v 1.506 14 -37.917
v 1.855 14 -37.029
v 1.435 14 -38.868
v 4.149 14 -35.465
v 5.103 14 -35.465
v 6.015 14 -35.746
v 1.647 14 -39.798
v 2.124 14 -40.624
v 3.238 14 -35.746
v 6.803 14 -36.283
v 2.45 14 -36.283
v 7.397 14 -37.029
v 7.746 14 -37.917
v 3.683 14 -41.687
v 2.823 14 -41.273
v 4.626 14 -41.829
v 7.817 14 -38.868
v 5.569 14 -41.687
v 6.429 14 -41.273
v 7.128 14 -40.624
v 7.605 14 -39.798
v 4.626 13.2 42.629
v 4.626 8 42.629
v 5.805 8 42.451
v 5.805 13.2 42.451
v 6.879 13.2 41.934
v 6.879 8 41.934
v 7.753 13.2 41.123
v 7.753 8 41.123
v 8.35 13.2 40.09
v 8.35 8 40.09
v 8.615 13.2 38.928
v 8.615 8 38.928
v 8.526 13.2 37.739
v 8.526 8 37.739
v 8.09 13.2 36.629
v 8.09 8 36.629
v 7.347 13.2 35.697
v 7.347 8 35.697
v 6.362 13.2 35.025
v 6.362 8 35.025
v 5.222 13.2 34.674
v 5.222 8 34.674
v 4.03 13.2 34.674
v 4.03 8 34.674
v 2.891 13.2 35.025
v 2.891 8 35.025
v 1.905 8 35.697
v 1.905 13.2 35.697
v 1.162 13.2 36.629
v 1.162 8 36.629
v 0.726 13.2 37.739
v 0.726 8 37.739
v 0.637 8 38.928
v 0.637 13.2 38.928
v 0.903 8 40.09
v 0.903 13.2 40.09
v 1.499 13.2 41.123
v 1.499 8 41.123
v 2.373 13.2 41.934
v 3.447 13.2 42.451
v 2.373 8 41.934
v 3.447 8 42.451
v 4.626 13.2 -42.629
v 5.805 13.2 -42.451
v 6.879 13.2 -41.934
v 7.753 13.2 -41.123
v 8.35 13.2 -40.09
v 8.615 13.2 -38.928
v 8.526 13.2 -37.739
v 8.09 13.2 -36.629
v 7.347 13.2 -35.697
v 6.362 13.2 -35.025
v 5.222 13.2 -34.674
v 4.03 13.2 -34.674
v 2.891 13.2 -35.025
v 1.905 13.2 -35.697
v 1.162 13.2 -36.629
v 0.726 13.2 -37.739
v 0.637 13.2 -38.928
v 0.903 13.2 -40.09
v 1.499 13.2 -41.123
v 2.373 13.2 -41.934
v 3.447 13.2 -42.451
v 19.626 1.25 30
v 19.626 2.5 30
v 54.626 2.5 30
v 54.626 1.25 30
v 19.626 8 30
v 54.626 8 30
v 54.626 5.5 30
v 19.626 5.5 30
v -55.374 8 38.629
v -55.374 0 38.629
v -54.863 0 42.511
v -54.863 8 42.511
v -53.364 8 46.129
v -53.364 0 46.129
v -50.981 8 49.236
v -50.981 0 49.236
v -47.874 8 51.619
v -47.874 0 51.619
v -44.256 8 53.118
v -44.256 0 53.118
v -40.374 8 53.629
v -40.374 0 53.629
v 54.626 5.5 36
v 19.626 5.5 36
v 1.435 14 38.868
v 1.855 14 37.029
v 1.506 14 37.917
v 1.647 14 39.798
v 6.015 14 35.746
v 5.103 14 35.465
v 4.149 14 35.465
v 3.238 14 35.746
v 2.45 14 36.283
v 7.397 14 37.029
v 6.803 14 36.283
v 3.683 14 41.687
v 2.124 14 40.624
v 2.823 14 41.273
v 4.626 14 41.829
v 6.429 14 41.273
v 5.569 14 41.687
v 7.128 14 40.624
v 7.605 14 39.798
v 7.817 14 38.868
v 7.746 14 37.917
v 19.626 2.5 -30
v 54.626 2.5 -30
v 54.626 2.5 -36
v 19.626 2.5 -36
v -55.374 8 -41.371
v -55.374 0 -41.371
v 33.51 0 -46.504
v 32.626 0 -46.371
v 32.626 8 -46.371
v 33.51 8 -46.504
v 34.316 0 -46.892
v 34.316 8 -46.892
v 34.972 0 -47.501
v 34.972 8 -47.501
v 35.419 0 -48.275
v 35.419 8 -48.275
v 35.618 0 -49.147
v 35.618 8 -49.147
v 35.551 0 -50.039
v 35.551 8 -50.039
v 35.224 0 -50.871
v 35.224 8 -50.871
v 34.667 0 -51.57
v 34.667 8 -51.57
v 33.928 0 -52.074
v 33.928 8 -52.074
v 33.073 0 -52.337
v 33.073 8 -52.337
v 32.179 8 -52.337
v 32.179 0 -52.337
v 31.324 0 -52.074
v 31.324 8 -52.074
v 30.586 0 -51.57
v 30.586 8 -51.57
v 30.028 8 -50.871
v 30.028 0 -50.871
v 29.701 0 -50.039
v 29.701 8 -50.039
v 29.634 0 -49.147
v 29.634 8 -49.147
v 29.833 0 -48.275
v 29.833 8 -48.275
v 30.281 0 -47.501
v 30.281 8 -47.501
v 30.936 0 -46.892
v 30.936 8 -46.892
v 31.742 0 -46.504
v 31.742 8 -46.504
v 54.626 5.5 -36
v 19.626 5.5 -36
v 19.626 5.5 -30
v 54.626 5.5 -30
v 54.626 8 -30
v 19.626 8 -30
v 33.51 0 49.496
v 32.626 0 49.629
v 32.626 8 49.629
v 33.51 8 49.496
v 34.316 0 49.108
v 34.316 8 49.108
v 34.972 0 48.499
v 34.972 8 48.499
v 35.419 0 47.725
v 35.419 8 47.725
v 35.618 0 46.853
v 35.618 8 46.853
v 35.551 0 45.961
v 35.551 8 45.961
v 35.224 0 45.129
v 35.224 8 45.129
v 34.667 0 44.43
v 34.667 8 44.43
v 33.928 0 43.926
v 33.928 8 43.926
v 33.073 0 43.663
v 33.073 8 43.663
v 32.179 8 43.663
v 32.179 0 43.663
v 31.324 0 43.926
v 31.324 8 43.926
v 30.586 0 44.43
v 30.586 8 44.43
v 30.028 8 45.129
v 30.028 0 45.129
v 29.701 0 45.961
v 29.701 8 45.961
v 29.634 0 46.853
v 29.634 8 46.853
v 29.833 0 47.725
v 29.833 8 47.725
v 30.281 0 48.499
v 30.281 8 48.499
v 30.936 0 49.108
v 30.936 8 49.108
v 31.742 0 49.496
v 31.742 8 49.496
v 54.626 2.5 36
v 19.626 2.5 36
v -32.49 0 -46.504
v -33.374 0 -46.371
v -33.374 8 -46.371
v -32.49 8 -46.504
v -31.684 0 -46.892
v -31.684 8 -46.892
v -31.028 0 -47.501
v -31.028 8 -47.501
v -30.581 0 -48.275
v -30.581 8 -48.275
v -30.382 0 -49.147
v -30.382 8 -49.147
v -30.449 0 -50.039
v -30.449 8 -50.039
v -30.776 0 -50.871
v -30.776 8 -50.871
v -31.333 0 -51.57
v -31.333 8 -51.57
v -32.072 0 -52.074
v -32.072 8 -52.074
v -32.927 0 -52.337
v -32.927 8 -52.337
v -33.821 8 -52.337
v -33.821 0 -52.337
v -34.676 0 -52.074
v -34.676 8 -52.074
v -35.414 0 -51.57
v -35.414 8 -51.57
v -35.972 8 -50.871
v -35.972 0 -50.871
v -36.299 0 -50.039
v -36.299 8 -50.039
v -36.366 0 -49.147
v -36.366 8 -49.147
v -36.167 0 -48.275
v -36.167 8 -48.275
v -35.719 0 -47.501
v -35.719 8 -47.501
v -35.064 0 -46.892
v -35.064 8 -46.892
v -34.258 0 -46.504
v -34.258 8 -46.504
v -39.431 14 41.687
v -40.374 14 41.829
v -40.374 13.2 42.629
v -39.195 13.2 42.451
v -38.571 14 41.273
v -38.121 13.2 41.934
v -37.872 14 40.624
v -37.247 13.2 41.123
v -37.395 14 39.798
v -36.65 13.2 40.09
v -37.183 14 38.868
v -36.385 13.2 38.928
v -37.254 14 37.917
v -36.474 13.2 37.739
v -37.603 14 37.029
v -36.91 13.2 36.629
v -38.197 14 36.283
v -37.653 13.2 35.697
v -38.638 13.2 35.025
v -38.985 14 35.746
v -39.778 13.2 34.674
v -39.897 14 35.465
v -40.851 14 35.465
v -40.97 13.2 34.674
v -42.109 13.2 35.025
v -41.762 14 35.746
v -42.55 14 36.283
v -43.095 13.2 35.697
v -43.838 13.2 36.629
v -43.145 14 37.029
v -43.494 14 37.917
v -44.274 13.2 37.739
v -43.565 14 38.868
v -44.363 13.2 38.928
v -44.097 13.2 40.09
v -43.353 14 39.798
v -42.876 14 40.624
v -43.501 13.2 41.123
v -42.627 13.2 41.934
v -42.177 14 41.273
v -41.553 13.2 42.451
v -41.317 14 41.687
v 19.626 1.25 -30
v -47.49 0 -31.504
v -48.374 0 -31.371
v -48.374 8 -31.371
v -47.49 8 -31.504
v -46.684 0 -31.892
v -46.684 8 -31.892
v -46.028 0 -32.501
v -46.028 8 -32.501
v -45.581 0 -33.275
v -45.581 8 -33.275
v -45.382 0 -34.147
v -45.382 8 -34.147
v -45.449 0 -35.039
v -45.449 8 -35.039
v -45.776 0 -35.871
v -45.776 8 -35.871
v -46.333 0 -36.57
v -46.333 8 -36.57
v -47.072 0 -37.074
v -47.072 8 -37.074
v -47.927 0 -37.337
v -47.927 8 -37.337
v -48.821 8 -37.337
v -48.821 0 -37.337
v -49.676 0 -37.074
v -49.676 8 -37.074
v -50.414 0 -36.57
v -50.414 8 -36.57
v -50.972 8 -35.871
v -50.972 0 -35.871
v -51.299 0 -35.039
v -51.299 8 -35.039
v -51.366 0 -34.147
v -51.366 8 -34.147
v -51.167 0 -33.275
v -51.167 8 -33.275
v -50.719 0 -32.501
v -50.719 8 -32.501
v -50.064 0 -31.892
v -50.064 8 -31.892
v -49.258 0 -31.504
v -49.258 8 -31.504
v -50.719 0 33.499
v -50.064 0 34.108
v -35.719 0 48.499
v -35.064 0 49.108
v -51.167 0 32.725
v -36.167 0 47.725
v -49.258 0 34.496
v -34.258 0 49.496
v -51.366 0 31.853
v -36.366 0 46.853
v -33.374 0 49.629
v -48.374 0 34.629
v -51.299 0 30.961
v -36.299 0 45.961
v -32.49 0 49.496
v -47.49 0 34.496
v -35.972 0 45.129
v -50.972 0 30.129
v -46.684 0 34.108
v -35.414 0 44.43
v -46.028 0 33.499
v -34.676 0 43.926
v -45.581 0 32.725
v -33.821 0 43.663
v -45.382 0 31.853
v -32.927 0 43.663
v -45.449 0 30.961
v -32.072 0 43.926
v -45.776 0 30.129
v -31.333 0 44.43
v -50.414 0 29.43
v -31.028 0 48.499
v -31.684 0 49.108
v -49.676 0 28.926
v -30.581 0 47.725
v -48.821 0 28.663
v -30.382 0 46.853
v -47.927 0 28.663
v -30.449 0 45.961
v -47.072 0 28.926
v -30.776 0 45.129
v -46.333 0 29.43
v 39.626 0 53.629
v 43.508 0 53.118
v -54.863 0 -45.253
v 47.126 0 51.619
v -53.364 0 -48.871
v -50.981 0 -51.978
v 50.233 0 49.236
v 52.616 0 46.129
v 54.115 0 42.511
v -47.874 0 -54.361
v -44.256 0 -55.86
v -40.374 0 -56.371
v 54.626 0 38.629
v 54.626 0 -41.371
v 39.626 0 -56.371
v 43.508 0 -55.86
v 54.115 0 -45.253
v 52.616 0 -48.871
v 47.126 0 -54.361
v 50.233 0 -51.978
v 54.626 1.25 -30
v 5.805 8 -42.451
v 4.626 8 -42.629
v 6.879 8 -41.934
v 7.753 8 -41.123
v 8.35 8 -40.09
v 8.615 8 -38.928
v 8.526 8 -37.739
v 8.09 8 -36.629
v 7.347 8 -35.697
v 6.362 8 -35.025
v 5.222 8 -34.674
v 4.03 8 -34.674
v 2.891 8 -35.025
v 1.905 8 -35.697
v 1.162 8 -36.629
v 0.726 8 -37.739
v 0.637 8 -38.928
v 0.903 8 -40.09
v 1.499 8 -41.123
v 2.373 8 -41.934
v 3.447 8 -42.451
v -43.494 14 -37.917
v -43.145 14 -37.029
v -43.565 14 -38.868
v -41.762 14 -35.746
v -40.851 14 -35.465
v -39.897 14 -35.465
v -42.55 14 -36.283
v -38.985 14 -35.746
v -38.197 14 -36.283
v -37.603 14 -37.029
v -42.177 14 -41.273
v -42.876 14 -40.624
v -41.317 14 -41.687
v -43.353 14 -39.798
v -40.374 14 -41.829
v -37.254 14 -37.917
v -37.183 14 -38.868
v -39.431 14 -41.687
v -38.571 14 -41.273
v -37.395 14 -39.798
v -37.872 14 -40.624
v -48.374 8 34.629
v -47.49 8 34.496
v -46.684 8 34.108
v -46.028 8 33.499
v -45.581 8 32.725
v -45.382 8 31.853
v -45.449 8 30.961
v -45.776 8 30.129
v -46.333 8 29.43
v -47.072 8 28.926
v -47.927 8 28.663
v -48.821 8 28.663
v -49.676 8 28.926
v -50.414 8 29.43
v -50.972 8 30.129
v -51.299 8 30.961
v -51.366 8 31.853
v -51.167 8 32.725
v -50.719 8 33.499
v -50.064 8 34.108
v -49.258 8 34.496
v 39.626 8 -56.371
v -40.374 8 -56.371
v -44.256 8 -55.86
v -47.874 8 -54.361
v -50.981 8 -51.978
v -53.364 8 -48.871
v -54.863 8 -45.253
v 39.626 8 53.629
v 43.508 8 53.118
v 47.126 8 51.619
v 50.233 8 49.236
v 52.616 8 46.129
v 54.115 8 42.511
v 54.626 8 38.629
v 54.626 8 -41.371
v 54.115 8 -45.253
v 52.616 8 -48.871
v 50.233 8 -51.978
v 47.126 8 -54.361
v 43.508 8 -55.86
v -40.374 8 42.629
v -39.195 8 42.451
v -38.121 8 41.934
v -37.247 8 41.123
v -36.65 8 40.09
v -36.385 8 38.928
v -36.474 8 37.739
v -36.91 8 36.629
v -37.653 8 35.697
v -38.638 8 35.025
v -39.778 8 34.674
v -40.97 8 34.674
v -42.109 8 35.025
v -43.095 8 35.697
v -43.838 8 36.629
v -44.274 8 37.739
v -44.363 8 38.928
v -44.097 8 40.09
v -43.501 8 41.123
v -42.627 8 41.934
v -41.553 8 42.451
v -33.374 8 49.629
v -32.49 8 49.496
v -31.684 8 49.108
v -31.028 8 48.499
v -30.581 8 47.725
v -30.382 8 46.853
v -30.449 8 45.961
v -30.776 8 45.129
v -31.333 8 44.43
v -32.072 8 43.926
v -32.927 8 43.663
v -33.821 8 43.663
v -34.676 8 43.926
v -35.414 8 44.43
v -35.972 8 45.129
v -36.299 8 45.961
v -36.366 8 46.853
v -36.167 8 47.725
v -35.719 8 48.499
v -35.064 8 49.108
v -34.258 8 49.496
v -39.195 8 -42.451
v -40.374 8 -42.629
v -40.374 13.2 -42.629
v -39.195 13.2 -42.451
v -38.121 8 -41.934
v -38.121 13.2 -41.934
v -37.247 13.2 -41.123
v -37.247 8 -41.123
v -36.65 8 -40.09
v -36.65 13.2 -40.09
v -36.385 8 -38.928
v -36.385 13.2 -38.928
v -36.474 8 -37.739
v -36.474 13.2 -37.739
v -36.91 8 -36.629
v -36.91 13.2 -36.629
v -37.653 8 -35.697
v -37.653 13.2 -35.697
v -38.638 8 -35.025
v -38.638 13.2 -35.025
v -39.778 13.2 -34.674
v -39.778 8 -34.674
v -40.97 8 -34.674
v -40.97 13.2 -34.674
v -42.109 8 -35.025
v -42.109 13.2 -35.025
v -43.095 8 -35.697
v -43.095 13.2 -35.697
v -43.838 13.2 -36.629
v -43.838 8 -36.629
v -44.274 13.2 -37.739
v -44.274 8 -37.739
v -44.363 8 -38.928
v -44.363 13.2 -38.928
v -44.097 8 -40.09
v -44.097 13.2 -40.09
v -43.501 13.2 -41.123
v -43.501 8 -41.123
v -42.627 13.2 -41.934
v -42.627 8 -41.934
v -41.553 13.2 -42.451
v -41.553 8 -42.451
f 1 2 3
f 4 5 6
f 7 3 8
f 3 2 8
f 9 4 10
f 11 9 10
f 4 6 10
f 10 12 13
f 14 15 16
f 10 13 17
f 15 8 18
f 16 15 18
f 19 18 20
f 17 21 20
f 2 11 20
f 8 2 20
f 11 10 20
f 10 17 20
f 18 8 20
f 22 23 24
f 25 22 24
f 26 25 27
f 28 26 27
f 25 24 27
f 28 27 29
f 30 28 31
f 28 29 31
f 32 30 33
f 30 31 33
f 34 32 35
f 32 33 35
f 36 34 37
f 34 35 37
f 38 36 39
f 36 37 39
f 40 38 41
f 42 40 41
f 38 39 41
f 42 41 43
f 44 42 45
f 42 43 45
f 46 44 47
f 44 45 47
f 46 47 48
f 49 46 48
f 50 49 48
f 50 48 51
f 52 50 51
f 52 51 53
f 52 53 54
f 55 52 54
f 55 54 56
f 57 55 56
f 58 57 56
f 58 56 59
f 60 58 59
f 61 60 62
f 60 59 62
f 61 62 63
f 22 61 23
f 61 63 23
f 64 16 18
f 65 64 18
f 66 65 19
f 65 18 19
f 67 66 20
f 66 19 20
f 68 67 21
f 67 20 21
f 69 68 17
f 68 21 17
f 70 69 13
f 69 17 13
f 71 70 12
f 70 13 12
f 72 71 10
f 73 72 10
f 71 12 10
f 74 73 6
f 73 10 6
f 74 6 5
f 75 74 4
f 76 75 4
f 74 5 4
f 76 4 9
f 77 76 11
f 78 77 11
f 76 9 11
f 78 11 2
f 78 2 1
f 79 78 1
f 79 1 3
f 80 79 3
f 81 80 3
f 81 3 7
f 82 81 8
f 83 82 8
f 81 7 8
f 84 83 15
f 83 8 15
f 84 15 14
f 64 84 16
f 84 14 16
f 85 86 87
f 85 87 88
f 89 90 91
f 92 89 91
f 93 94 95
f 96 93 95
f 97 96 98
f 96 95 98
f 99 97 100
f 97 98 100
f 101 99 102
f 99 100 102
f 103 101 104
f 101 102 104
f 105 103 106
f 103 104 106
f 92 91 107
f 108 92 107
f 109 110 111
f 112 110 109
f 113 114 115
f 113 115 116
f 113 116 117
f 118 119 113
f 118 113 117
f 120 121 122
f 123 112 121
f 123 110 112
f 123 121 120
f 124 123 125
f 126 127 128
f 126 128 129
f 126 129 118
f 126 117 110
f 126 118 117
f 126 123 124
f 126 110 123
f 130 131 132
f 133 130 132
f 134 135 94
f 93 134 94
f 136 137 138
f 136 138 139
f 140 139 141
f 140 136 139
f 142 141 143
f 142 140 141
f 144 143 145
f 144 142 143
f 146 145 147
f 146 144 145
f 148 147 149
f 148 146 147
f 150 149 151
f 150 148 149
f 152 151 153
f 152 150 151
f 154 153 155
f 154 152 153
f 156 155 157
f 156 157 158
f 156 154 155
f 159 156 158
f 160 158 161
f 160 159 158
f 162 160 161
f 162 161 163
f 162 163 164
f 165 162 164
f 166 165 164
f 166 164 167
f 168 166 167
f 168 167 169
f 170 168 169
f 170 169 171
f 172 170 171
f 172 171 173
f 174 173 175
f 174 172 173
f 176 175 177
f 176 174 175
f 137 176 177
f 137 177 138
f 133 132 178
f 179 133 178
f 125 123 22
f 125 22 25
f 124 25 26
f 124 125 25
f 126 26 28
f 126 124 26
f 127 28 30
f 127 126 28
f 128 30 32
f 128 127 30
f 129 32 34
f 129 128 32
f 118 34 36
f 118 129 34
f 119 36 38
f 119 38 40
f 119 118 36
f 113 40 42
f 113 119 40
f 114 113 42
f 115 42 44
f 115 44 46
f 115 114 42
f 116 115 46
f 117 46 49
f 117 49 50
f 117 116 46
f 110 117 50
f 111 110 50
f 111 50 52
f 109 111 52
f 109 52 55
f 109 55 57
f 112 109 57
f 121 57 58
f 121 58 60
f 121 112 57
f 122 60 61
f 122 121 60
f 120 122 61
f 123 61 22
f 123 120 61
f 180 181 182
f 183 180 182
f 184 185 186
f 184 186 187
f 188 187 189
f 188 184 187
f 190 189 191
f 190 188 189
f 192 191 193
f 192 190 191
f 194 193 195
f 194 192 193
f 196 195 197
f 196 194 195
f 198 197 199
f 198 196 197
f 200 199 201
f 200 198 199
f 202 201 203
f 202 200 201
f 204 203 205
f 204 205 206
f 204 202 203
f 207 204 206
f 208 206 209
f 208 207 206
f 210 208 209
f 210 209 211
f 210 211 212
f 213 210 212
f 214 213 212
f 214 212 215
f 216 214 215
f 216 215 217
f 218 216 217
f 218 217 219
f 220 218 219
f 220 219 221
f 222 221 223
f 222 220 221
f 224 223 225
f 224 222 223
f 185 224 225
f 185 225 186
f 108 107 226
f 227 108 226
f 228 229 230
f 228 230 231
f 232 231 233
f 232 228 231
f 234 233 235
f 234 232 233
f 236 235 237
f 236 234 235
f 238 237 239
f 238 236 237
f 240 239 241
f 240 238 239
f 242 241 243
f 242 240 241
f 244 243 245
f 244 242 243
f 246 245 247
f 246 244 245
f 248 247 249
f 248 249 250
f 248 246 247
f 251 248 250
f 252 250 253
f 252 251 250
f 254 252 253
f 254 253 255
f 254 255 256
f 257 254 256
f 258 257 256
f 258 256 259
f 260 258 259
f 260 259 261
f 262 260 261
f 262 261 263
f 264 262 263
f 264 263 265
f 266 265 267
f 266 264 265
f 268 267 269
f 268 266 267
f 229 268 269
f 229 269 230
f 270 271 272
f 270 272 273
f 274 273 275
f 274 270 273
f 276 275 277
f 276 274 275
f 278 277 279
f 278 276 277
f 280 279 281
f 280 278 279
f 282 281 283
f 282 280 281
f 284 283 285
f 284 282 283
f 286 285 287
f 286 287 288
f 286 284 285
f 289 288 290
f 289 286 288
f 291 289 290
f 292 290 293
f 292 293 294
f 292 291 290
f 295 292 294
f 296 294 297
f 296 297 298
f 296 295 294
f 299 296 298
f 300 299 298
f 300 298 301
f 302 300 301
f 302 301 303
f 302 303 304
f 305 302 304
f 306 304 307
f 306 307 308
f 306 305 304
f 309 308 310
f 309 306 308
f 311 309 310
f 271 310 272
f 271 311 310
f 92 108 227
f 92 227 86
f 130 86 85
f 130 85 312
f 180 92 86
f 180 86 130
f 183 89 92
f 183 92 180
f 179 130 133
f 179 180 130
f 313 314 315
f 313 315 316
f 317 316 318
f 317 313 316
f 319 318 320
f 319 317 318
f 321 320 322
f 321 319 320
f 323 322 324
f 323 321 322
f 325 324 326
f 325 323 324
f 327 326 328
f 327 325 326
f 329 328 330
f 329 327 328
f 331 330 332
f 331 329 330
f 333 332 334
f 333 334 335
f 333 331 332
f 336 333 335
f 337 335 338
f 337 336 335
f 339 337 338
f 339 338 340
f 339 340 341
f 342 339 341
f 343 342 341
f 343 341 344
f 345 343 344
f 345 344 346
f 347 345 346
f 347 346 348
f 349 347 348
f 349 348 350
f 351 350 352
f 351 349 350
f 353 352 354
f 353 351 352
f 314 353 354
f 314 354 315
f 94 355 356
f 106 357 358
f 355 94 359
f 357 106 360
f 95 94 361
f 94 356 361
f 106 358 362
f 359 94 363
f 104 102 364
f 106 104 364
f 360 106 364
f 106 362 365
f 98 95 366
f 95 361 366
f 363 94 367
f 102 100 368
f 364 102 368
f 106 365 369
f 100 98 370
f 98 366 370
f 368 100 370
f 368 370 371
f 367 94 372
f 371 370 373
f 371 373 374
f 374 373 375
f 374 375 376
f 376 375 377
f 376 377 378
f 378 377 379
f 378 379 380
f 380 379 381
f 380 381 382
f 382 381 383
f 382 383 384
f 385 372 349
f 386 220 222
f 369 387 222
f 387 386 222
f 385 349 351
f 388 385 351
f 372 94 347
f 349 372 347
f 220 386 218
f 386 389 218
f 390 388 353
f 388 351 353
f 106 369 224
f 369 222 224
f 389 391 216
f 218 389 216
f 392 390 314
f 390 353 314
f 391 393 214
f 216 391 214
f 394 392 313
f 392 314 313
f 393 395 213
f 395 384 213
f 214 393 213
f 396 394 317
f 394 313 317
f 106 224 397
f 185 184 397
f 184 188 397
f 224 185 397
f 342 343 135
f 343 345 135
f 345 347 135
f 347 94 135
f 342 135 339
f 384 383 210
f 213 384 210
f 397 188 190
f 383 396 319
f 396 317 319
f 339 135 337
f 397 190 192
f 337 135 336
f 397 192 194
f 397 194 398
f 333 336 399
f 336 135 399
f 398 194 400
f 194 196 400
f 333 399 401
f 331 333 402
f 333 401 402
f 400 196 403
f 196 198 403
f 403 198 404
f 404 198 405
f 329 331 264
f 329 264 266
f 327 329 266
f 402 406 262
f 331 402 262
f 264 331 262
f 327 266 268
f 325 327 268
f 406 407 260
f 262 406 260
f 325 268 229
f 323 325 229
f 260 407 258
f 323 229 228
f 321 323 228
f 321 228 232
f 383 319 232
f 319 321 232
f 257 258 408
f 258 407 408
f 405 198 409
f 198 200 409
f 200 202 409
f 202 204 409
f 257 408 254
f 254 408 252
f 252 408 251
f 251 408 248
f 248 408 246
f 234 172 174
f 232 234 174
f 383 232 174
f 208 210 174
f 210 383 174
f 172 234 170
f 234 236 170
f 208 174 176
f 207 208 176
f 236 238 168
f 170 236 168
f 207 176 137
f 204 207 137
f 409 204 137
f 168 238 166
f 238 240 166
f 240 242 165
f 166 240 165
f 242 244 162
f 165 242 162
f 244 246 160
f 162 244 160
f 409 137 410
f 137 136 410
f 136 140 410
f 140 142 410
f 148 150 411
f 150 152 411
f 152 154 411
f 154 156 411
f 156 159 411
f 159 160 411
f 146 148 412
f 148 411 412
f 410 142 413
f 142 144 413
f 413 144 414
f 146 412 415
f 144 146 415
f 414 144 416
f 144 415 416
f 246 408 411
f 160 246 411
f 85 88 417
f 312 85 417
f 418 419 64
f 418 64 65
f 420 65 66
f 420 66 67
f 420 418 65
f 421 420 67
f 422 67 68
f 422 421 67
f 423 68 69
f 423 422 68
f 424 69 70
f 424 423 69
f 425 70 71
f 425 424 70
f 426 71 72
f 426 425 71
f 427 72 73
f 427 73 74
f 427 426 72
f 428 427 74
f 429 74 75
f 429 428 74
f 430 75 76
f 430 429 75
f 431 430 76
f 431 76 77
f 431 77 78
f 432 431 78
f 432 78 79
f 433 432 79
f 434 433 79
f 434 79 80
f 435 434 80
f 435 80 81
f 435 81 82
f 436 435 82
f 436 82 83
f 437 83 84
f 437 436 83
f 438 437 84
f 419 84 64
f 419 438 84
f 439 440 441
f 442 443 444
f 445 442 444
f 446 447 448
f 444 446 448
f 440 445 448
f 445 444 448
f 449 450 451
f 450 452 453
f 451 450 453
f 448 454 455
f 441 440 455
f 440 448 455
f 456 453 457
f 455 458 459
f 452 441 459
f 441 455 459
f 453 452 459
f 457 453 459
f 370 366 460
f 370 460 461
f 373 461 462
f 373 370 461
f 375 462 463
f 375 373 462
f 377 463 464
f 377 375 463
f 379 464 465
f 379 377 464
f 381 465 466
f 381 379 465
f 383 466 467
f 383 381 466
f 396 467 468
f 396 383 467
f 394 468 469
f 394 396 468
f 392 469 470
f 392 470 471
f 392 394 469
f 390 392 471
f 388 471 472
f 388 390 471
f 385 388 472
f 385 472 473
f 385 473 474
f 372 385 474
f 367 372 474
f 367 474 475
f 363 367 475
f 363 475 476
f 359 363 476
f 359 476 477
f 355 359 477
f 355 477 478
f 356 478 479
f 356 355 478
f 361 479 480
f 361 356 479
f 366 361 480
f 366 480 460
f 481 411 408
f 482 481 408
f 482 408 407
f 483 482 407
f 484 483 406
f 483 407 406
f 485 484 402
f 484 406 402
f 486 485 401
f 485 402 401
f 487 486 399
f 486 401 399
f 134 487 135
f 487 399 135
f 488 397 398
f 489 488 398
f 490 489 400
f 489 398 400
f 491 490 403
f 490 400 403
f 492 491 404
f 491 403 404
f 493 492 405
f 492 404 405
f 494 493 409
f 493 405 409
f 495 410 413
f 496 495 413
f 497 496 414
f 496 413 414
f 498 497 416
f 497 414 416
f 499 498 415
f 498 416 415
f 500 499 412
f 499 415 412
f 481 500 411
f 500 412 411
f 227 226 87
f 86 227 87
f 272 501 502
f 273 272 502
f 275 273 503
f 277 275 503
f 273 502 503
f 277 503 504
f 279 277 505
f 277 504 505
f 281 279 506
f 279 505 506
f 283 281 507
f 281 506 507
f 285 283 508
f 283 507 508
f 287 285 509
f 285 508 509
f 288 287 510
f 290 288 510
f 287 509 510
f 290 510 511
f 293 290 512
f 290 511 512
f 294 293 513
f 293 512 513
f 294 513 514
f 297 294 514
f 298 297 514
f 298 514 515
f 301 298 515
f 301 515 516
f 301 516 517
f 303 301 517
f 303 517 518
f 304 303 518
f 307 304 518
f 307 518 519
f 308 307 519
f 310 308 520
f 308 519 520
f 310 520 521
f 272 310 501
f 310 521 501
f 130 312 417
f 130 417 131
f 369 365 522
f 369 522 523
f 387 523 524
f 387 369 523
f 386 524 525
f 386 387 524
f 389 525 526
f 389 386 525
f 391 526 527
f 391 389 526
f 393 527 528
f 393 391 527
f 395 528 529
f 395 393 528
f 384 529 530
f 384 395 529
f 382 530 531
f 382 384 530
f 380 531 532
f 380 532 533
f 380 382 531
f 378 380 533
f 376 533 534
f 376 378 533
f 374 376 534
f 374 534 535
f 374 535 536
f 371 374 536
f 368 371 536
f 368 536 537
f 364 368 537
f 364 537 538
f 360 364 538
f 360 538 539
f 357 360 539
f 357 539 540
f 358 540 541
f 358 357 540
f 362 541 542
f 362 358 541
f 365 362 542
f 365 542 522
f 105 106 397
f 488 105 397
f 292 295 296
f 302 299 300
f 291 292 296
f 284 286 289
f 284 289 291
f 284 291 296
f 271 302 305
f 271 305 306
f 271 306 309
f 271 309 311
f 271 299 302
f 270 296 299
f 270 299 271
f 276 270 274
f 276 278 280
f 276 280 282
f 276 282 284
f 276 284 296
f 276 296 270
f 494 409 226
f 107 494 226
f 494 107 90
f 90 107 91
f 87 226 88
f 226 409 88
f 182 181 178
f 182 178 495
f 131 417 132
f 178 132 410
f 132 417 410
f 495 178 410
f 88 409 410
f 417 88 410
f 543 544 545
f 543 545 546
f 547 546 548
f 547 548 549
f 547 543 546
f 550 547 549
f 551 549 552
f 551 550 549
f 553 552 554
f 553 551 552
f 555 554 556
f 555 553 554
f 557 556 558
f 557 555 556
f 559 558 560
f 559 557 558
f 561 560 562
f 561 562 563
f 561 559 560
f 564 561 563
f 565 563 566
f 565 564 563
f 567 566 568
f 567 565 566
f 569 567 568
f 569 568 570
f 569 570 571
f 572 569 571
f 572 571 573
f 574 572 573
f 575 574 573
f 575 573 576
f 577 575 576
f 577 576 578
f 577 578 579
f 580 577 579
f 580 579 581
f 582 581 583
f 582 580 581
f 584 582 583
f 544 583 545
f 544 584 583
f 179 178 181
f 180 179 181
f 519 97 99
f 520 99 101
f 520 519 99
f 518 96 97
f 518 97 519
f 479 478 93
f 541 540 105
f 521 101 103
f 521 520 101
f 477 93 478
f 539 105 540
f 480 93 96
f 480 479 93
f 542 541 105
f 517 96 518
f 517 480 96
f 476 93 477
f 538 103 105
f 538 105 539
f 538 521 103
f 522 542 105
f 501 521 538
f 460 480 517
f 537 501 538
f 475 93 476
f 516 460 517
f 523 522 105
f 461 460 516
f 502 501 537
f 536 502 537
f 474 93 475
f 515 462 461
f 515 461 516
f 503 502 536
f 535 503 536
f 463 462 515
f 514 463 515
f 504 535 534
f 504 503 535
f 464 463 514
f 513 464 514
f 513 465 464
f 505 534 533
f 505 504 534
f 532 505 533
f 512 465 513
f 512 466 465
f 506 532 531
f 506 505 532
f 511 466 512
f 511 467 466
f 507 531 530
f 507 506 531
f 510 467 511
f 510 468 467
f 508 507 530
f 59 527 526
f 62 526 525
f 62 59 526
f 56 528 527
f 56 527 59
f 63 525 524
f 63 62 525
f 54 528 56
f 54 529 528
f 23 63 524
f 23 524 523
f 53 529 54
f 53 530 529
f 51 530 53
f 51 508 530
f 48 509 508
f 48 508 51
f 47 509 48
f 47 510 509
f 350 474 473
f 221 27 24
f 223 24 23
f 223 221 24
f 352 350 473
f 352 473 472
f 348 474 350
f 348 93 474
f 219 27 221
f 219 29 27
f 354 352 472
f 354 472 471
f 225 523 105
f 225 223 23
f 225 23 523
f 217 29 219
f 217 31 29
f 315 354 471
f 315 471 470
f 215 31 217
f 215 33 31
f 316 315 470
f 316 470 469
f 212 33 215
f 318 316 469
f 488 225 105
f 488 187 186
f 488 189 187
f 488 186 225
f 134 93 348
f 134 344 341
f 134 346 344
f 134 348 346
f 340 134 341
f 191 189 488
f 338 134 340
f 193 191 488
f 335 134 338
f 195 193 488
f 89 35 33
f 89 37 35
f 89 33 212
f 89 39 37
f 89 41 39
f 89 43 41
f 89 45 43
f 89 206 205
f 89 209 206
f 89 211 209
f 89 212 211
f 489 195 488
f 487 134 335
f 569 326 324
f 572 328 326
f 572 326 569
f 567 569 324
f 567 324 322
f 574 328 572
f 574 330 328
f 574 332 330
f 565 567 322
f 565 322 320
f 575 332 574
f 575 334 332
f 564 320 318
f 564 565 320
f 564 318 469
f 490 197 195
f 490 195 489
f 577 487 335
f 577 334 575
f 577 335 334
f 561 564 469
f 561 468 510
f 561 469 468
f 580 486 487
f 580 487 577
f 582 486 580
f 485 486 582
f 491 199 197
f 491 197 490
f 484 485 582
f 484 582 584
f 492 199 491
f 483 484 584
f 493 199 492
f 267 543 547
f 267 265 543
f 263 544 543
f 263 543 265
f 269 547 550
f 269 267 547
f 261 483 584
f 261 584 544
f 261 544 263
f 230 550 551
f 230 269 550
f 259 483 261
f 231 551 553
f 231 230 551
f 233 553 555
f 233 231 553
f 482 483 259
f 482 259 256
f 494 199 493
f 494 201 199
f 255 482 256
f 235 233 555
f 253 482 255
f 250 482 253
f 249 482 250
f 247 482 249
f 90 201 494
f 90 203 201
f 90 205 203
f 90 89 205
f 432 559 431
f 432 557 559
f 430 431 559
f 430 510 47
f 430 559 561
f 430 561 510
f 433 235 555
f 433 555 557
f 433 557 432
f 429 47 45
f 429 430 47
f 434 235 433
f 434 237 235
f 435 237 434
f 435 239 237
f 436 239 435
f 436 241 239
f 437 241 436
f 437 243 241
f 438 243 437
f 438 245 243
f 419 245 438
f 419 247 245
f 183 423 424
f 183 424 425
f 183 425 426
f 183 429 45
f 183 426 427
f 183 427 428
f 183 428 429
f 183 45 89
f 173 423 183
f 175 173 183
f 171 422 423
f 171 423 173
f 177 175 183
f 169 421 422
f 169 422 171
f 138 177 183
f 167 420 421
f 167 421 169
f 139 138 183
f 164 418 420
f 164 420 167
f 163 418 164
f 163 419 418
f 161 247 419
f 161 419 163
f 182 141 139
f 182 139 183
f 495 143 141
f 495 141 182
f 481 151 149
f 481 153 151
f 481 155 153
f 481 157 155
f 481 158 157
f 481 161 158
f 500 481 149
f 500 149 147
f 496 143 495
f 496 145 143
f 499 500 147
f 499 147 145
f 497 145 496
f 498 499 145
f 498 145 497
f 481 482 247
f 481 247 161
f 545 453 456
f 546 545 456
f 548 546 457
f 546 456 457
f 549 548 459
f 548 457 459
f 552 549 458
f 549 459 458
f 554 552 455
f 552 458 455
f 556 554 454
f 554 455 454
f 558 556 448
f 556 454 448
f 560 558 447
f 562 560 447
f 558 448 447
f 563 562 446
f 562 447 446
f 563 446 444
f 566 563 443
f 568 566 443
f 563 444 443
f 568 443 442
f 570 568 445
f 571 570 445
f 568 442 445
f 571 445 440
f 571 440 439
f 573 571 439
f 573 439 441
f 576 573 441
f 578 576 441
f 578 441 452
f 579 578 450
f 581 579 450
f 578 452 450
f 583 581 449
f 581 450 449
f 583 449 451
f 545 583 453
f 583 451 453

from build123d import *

# Parameters (mm, degrees)
SKETCH1_R                = 3
BOSS_EXTRUDE1_DEPTH      = 8
CUT_EXTRUDE1_DEPTH       = 35
SKETCH4_R                = 4
BOSS_EXTRUDE2_DEPTH      = 6
CHAMFER1_SIZE            = 0.8
CHAMFER1_OF_MIRROR1_SIZE = 0.8


with BuildPart() as part:
    # Sketch1 → Boss-Extrude1 (new body)
    with BuildSketch(Plane(origin=(0, 0, 0), x_dir=(1, 0, 0), z_dir=(0, 1, 0))):
        with BuildLine():
            Line((39.626089151, 56.371006445), (-40.373910849, 56.371006445))
            ThreePointArc((-40.373910849, 56.371006445), (-50.980512566, 51.977608163), (-55.373910849, 41.371006445))
            Line((-55.373910849, 41.371006445), (-55.373910849, -38.628993555))
            ThreePointArc((-55.373910849, -38.628993555), (-50.980512566, -49.235595273), (-40.373910849, -53.628993555))
            Line((-40.373910849, -53.628993555), (39.626089151, -53.628993555))
            ThreePointArc((39.626089151, -53.628993555), (50.232690869, -49.235595273), (54.626089151, -38.628993555))
            Line((54.626089151, -38.628993555), (54.626089151, 41.371006445))
            ThreePointArc((54.626089151, 41.371006445), (50.232690869, 51.977608163), (39.626089151, 56.371006445))
        make_face()
        with Locations(Location((-48.373910849, 34.371006445, 0), (0, 0, 270))):
            Circle(SKETCH1_R, mode=Mode.SUBTRACT)
        with Locations(Location((-33.373910849, 49.371006445, 0), (0, 0, 270))):
            Circle(SKETCH1_R, mode=Mode.SUBTRACT)
        with Locations(Location((32.626089151, 49.371006445, 0), (0, 0, 270))):
            Circle(SKETCH1_R, mode=Mode.SUBTRACT)
        with Locations(Location((-48.373910849, -31.628993555, 0), (0, 0, 270))):
            Circle(SKETCH1_R, mode=Mode.SUBTRACT)
        with Locations(Location((-33.373910849, -46.628993555, 0), (0, 0, 270))):
            Circle(SKETCH1_R, mode=Mode.SUBTRACT)
        with Locations(Location((32.626089151, -46.628993555, 0), (0, 0, 270))):
            Circle(SKETCH1_R, mode=Mode.SUBTRACT)
    extrude(amount=BOSS_EXTRUDE1_DEPTH)

    # Sketch3 → Cut-Extrude1 (cut)
    with BuildSketch(Plane(origin=(54.626089151, 0, 0), x_dir=(0, 0, -1), z_dir=(1, 0, 0))):
        Polygon((-30, 8), (-30, 5.5), (-36, 5.5), (-36, 2.5), (-30, 2.5), (-30, 1.25), (30, 1.25), (30, 2.5), (36, 2.5), (36, 5.5), (30, 5.5), (30, 8), align=None)
    extrude(amount=-CUT_EXTRUDE1_DEPTH, mode=Mode.SUBTRACT)

    # Sketch4 → Boss-Extrude2 (add)
    with BuildSketch(Plane(origin=(0, 8, 0), x_dir=(1, 0, 0), z_dir=(0, 1, 0))):
        with Locations(Location((4.626089151, -38.628993555, 0), (0, 0, 270))):
            Circle(SKETCH4_R)
        with Locations(Location((-40.373910849, -38.628993555, 0), (0, 0, 270))):
            Circle(SKETCH4_R)
    boss_extrude2 = extrude(amount=BOSS_EXTRUDE2_DEPTH)

    # Chamfer1
    chamfer1_edges = [part.edges().sort_by_distance(p)[0] for p in [
        (4.626089151, 14, 34.628993555),
        (-40.373910849, 14, 34.628993555),
    ]]
    chamfer(chamfer1_edges, length=CHAMFER1_SIZE)

    # Mirror1: Boss-Extrude2 across plane
    add(boss_extrude2.mirror(Plane.XY))

    # Chamfer1 of Mirror1
    chamfer1_of_mirror1_edges = [part.edges().sort_by_distance(p)[0] for p in [
        (4.626089151, 14, -34.628993555),
        (-40.373910849, 14, -34.628993555),
    ]]
    chamfer(chamfer1_of_mirror1_edges, length=CHAMFER1_OF_MIRROR1_SIZE)


solid = part.part
